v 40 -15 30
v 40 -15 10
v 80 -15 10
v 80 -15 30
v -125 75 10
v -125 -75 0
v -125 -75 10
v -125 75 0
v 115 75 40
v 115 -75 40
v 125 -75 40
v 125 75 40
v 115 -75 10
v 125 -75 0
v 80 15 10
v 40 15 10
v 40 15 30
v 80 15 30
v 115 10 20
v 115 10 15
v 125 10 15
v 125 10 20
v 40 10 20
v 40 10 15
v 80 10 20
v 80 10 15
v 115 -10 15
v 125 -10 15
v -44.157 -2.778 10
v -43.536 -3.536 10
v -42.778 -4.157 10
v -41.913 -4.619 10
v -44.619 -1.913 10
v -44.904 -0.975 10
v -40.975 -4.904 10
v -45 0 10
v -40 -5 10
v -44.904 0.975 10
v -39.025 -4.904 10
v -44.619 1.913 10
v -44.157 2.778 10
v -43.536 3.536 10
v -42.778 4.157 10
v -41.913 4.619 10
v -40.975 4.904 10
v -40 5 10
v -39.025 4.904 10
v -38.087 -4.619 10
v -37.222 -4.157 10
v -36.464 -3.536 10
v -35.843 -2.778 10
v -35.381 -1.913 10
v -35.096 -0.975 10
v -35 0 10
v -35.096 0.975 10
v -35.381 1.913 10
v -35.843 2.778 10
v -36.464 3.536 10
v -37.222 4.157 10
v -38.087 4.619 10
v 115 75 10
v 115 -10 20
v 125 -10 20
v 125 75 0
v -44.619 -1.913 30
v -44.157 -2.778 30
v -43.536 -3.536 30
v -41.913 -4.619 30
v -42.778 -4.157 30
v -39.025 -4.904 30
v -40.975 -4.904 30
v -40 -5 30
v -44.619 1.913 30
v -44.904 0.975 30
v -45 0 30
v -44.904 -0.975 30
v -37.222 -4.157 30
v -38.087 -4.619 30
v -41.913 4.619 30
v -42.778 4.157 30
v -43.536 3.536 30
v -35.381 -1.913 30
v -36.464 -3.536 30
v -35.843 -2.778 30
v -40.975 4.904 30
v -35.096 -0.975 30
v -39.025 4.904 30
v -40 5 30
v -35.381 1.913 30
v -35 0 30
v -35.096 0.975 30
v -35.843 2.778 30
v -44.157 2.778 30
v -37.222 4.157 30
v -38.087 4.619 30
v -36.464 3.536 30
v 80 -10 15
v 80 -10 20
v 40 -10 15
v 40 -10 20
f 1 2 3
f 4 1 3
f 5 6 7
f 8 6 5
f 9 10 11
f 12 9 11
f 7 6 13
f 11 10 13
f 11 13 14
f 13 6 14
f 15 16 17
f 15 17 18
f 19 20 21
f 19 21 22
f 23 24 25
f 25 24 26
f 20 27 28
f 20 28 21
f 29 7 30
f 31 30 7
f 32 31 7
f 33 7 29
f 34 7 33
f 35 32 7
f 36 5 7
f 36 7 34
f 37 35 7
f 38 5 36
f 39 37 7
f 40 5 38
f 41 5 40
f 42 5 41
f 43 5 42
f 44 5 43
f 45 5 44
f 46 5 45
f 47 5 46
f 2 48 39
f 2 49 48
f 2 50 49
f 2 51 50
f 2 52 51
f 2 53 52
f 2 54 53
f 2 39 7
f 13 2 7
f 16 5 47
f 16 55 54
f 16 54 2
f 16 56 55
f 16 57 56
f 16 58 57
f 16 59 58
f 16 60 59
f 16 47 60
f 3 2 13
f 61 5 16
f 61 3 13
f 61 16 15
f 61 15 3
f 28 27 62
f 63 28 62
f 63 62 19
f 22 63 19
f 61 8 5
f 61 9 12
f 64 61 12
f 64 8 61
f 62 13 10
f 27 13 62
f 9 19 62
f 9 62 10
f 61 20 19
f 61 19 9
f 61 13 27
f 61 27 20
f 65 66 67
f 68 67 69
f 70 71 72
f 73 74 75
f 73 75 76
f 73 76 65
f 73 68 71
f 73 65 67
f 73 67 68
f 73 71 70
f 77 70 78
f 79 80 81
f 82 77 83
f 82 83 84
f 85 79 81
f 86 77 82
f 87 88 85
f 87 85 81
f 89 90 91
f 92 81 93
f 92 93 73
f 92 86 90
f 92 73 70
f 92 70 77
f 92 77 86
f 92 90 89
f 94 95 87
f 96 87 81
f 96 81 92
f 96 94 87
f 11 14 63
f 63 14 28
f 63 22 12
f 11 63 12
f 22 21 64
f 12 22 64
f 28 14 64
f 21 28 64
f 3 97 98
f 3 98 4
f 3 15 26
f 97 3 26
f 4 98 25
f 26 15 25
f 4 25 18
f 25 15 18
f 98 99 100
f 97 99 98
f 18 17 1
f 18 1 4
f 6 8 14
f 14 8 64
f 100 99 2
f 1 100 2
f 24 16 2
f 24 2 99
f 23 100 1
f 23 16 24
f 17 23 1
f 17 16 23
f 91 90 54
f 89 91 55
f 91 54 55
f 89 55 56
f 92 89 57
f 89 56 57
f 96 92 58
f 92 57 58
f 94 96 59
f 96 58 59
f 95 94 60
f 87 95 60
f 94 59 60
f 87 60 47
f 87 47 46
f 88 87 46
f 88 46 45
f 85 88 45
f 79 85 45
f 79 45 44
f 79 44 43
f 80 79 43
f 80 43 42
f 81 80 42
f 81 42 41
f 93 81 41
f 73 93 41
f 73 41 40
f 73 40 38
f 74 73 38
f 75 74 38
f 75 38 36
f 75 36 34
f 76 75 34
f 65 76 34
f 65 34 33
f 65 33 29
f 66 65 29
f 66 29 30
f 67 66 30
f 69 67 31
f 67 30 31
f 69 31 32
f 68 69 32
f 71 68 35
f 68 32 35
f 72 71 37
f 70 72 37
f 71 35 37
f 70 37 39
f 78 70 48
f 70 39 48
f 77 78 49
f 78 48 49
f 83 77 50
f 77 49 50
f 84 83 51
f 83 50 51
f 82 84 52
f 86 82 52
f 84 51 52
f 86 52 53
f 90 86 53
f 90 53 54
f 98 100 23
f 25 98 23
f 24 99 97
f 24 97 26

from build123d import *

# Parameters (mm, degrees)
SKETCH1_W           = 250
SKETCH1_H           = 150
SKETCH1_R           = 5
SKETCH1_W_2         = 40
SKETCH1_H_2         = 5
BOSS_EXTRUDE1_DEPTH = 10
SKETCH1_5_W         = 10
SKETCH1_5_H         = 150
BOSS_EXTRUDE2_DEPTH = 40
SKETCH1_6_R         = 5
BOSS_EXTRUDE3_DEPTH = 30
SKETCH1_7_W         = 40
SKETCH1_7_H         = 5
BOSS_EXTRUDE4_DEPTH = 30
SKETCH6_W           = 5
SKETCH6_H           = 20
SKETCH6_W_2         = 10
SKETCH6_H_2         = 20.218770798
BOSS_EXTRUDE5_DEPTH = 40
SKETCH7_W           = 5
SKETCH7_H           = 20
CUT_EXTRUDE1_DEPTH  = 10


with BuildPart() as part:
    # Sketch1 → Boss-Extrude1 (new body)
    with BuildSketch(Plane.XY):
        Rectangle(SKETCH1_W, SKETCH1_H)
        with Locations((-40, 0)):
            Circle(SKETCH1_R, mode=Mode.SUBTRACT)
        with Locations((60, -12.5)):
            Rectangle(SKETCH1_W_2, SKETCH1_H_2, mode=Mode.SUBTRACT)
        with Locations((60, 12.5)):
            Rectangle(SKETCH1_W_2, SKETCH1_H_2, mode=Mode.SUBTRACT)
    extrude(amount=BOSS_EXTRUDE1_DEPTH)

    # Sketch1<5> → Boss-Extrude2 (add)
    with BuildSketch(Plane.XY):
        with Locations((120, 0)):
            Rectangle(SKETCH1_5_W, SKETCH1_5_H)
    extrude(amount=BOSS_EXTRUDE2_DEPTH)

    # Sketch1<6> → Boss-Extrude3 (add)
    with BuildSketch(Plane.XY):
        with Locations((-40, 0)):
            Circle(SKETCH1_6_R)
    extrude(amount=BOSS_EXTRUDE3_DEPTH)

    # Sketch1<7> → Boss-Extrude4 (add)
    with BuildSketch(Plane.XY):
        with Locations((60, -12.5)):
            Rectangle(SKETCH1_7_W, SKETCH1_7_H)
        with Locations((60, 12.5)):
            Rectangle(SKETCH1_7_W, SKETCH1_7_H)
    extrude(amount=BOSS_EXTRUDE4_DEPTH)

    # Sketch6 → Boss-Extrude5 (add)
    with BuildSketch(Plane.ZY.offset(-40)):
        with Locations((12.5, 0)):
            Rectangle(SKETCH6_W, SKETCH6_H)
        with Locations((25, -0.109385399)):
            Rectangle(SKETCH6_W_2, SKETCH6_H_2)
    extrude(amount=-BOSS_EXTRUDE5_DEPTH)

    # Sketch7 → Cut-Extrude1 (cut)
    with BuildSketch(Plane.ZY.offset(-115)):
        with Locations((17.5, 0)):
            Rectangle(SKETCH7_W, SKETCH7_H)
    extrude(amount=-CUT_EXTRUDE1_DEPTH, mode=Mode.SUBTRACT)


solid = part.part
